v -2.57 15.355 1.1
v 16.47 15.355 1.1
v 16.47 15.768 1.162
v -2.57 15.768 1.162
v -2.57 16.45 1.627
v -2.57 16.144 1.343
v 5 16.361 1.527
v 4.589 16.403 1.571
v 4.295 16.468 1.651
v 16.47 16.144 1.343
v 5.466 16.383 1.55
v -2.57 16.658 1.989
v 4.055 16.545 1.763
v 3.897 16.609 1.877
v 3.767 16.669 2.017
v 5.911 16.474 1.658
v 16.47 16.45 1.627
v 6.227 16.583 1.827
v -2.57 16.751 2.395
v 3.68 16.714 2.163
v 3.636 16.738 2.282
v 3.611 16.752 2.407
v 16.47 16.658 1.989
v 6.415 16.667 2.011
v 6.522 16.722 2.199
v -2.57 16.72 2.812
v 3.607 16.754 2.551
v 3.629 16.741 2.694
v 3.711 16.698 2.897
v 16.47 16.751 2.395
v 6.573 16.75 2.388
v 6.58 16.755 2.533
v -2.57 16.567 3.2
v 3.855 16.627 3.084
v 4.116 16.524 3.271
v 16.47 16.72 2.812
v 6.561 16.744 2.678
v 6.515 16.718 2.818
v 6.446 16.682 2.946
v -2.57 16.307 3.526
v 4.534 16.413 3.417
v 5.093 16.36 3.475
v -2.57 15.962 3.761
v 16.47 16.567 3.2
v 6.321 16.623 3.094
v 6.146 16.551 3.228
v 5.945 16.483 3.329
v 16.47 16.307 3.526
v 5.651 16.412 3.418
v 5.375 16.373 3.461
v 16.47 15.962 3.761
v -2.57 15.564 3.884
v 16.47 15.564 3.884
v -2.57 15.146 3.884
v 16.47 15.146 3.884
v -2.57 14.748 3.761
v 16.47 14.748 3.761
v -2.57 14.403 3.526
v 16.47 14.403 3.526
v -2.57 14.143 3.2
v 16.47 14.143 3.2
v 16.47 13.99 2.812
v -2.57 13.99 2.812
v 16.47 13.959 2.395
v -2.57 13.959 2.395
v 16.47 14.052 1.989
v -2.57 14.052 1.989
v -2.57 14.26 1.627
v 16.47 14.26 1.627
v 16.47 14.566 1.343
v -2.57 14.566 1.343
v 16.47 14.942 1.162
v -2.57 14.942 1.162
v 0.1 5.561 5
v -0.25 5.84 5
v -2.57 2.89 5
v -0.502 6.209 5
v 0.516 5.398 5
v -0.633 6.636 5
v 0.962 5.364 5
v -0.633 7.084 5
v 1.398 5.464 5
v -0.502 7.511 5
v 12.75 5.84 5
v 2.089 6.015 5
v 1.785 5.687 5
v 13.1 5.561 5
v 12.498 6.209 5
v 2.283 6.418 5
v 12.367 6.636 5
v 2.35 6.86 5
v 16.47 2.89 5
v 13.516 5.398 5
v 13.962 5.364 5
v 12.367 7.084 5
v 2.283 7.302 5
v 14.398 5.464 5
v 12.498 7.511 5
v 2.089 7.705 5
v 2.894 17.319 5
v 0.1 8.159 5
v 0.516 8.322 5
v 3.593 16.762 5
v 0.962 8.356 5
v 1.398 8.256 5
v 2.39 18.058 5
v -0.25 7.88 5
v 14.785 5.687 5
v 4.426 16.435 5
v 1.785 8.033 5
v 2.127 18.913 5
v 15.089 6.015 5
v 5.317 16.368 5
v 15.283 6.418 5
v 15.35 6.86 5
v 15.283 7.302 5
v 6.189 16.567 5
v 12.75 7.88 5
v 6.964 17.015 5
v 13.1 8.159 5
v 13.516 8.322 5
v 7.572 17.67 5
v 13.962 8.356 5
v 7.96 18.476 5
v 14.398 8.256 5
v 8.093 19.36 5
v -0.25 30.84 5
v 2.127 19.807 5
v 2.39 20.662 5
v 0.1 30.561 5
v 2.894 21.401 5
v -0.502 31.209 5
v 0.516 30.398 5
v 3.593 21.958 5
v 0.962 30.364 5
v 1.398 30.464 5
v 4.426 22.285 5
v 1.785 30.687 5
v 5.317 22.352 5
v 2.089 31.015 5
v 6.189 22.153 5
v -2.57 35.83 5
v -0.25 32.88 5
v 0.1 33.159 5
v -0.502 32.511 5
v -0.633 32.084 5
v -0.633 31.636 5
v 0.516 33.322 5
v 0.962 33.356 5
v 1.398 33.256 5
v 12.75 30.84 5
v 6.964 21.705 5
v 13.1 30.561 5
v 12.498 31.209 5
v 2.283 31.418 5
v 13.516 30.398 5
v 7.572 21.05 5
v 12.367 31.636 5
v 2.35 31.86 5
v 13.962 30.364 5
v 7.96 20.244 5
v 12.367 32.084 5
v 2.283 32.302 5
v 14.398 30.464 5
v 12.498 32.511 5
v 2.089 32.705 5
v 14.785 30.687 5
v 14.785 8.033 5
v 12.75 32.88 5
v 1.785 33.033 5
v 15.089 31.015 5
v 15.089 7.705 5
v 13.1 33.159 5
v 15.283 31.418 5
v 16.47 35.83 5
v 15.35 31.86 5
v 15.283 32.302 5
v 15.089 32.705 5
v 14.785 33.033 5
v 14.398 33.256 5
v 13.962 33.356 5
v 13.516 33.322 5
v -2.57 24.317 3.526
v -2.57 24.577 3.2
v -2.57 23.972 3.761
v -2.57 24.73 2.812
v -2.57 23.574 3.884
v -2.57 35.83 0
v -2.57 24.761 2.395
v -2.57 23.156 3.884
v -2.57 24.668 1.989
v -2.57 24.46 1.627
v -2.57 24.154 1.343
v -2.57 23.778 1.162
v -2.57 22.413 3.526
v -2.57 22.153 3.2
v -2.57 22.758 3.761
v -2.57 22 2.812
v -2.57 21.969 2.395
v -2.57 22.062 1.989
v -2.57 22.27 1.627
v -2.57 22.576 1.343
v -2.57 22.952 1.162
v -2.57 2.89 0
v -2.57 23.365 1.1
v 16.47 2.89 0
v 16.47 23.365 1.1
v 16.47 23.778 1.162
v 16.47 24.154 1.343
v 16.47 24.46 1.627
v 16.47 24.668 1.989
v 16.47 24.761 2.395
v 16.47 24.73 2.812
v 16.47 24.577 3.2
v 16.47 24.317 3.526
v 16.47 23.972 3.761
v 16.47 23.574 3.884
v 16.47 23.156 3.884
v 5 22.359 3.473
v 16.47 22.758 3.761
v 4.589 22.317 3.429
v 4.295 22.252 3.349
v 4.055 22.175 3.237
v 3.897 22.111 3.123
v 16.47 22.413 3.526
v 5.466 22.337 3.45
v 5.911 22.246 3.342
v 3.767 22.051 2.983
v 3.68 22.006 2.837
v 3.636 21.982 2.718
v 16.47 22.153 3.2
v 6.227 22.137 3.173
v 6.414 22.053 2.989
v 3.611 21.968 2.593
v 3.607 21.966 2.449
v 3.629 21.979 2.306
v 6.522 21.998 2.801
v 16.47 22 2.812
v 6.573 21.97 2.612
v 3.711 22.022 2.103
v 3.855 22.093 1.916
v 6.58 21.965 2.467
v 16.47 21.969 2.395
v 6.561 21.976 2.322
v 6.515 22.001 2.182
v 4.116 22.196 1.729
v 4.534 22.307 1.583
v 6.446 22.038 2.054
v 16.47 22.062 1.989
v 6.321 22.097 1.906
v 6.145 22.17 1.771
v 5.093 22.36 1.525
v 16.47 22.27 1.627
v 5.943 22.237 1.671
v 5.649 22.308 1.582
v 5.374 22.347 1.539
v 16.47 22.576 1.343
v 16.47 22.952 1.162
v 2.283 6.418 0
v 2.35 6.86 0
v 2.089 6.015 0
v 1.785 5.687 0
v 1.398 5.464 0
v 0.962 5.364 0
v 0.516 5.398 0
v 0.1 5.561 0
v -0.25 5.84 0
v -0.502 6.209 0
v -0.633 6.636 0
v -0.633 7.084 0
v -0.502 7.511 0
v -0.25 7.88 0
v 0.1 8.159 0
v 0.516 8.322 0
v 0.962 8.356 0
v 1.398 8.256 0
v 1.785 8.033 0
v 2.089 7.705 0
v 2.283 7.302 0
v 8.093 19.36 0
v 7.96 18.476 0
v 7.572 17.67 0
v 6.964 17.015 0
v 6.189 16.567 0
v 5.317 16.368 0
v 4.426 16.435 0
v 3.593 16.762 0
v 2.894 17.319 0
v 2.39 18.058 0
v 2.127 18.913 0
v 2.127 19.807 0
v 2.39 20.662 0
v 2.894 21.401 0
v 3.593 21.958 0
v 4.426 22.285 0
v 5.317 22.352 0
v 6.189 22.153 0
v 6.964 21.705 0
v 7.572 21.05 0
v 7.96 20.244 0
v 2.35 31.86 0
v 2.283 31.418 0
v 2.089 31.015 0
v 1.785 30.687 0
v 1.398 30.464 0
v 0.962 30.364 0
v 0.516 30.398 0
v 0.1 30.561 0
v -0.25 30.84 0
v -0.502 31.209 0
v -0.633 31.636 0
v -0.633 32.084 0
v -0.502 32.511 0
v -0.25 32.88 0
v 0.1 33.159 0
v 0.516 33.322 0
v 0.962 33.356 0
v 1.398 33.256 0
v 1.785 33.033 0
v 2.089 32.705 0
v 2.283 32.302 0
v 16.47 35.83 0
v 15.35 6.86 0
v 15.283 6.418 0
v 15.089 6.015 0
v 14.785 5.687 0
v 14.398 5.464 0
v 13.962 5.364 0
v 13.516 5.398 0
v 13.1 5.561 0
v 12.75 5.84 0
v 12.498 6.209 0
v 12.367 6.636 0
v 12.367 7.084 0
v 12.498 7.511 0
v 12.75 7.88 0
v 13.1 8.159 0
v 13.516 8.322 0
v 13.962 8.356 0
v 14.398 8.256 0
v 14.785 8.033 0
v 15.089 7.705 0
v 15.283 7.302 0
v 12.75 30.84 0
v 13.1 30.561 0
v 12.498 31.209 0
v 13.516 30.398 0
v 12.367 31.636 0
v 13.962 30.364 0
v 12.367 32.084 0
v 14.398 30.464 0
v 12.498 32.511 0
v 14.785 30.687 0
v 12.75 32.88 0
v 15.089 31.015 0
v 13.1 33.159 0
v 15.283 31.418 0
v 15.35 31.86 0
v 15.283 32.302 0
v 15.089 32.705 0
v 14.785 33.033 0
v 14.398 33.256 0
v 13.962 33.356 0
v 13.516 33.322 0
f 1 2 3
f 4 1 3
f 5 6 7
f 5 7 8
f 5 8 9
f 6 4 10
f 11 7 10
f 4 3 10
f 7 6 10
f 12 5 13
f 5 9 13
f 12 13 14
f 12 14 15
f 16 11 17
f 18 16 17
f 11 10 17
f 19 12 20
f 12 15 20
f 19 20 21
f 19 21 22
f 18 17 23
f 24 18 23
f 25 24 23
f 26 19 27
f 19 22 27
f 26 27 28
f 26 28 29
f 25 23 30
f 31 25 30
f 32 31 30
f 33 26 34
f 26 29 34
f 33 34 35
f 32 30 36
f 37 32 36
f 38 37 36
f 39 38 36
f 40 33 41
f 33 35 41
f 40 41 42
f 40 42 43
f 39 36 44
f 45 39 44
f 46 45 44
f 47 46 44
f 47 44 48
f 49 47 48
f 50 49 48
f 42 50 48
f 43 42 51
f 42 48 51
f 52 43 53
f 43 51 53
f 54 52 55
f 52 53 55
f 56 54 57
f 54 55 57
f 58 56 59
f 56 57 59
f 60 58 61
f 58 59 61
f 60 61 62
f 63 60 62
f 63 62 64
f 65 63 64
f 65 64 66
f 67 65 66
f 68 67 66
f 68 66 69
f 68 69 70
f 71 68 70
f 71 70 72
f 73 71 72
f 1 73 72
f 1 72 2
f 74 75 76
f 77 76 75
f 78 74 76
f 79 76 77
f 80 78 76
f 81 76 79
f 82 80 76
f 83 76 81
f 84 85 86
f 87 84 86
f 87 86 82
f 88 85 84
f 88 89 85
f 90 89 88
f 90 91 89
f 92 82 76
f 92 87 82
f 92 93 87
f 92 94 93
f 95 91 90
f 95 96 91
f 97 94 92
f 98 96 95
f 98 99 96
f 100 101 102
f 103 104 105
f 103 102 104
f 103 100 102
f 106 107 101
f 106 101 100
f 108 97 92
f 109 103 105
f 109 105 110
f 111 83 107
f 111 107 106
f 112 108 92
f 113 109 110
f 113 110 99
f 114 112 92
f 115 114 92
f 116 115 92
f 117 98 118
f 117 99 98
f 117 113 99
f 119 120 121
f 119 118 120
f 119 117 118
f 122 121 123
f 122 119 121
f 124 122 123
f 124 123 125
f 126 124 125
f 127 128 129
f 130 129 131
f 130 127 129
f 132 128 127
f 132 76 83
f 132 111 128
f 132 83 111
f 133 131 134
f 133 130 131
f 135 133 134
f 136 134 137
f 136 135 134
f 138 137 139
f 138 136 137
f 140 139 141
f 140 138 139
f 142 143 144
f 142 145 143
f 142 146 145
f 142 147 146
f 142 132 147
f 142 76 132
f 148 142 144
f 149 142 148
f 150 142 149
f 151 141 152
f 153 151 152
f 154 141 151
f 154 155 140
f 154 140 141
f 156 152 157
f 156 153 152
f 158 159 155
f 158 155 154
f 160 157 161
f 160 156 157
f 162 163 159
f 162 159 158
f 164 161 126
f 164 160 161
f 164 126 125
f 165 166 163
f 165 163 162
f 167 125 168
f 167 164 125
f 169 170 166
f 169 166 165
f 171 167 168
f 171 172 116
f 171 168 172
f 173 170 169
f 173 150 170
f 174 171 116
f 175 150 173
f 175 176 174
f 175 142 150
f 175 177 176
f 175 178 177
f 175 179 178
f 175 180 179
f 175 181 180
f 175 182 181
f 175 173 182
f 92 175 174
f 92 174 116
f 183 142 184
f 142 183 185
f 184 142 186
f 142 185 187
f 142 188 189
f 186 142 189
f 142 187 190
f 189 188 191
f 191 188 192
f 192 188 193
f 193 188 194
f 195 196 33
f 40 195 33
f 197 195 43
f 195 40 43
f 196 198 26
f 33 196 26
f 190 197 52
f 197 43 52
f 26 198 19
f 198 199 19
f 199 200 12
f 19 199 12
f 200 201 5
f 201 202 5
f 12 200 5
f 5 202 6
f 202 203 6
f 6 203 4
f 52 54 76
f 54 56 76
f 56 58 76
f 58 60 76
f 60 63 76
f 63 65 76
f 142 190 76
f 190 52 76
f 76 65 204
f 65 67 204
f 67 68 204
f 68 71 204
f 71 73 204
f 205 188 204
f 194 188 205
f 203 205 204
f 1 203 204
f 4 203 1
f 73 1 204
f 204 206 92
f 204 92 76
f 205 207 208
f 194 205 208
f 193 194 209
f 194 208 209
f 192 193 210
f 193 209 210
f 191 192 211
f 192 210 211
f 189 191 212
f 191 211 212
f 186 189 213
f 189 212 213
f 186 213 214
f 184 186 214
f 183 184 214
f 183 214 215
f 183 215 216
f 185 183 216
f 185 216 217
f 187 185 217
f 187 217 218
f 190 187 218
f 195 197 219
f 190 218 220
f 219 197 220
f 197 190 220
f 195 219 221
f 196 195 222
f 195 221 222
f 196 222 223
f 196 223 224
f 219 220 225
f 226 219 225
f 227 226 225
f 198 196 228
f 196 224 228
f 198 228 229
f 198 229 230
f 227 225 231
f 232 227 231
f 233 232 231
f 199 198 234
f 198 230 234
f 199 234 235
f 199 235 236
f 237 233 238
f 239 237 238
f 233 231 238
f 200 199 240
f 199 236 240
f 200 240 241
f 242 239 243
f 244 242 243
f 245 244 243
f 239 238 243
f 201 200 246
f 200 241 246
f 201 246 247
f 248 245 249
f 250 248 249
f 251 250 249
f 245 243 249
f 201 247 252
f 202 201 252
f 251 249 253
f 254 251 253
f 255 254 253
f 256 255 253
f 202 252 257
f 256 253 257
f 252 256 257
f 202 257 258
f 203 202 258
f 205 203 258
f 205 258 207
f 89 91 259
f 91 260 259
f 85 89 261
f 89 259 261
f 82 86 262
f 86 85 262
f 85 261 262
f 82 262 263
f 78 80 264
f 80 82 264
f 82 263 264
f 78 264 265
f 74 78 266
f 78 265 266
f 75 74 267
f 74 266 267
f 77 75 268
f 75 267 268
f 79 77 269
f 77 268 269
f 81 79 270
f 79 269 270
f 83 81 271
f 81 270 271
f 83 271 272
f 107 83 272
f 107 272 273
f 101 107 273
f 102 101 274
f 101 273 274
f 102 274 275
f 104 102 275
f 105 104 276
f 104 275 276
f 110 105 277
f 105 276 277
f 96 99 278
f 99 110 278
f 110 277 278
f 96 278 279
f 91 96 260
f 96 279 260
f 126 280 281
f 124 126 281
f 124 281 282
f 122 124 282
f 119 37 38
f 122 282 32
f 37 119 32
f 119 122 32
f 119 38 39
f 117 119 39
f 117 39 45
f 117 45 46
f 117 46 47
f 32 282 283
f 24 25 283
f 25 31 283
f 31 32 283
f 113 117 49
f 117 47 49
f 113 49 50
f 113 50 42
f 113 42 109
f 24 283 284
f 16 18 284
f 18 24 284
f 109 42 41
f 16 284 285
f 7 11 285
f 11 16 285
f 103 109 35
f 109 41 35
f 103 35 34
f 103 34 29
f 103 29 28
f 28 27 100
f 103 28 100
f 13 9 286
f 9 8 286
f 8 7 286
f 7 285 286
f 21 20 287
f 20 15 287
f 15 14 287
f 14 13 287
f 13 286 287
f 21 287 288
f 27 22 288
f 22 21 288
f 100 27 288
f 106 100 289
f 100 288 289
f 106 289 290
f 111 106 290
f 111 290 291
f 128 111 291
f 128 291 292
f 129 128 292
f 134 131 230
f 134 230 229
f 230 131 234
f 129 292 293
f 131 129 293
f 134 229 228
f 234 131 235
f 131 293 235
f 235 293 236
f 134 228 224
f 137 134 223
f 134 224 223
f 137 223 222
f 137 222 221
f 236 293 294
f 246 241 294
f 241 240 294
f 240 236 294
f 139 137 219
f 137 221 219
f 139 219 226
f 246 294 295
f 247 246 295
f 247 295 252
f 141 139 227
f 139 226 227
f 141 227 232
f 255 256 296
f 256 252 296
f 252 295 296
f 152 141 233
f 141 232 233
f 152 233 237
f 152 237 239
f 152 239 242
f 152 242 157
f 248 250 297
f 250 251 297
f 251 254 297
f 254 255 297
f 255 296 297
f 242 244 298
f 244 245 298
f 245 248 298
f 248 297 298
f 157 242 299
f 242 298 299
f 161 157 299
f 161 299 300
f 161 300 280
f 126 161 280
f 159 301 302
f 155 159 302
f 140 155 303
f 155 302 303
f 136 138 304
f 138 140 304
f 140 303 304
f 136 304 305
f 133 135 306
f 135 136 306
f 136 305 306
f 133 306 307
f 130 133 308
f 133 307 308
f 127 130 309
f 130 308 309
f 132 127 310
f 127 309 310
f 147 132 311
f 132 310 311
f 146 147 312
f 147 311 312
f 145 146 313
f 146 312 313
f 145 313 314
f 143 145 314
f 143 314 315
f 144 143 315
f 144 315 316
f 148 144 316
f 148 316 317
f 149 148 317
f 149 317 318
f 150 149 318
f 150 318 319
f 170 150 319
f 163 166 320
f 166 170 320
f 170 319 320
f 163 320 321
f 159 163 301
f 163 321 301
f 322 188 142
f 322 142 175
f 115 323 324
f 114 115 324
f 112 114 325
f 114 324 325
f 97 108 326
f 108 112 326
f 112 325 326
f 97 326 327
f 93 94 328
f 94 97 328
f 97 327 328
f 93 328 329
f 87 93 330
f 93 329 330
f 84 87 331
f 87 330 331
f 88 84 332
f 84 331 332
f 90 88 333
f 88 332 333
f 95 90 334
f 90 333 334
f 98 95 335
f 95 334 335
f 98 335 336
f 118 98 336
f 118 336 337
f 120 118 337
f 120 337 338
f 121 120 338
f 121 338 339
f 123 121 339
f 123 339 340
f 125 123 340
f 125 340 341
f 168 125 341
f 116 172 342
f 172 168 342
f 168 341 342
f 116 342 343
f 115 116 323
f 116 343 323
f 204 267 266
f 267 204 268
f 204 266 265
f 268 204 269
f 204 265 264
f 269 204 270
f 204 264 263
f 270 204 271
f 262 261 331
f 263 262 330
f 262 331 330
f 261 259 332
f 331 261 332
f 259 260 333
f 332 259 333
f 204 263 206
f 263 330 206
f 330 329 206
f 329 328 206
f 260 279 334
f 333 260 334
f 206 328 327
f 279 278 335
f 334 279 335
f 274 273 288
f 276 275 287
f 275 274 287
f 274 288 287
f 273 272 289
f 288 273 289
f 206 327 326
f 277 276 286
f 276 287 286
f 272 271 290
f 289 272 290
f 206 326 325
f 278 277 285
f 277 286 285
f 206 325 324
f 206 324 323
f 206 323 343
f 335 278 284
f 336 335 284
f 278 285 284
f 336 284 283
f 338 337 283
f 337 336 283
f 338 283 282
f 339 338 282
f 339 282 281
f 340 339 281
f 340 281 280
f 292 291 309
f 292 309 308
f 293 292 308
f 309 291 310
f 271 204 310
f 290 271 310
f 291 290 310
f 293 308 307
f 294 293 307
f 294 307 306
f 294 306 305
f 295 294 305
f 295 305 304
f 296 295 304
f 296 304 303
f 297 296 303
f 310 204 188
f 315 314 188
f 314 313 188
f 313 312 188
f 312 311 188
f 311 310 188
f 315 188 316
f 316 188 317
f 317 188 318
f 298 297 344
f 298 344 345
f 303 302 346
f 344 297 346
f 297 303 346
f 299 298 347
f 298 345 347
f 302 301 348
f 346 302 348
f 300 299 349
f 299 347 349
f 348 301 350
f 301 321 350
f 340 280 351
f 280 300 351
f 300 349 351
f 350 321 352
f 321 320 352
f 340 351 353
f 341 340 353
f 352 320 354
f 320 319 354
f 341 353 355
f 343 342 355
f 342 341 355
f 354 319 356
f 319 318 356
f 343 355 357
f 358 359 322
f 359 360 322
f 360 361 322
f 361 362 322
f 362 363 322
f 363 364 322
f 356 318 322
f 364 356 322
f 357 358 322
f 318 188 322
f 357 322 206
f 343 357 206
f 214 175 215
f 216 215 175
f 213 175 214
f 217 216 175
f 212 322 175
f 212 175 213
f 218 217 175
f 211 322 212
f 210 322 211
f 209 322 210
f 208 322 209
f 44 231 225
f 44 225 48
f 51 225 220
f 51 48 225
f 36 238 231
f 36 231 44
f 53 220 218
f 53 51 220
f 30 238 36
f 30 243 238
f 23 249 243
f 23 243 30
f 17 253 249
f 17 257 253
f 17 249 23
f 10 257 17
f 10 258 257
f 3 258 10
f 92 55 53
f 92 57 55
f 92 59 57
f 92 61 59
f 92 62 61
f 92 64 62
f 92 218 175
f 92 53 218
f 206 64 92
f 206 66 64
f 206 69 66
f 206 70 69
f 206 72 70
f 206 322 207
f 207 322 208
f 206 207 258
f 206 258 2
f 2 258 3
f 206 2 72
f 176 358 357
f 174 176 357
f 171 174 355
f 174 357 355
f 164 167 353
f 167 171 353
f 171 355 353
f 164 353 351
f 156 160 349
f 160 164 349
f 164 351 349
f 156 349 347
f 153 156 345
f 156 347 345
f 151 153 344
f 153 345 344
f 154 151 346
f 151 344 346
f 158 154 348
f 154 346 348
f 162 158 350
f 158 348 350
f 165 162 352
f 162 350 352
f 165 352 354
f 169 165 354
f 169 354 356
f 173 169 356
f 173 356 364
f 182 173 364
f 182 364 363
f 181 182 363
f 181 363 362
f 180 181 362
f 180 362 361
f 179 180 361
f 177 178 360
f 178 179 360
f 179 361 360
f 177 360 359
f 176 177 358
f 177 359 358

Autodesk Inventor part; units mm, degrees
ref_plane "YZ Plane" through (0, 0, 0) normal (1, 0, 0) x (0, 1, 0)
ref_plane "XZ Plane" through (0, 0, 0) normal (0, 1, 0) x (-1, 0, 0)
ref_plane "XY Plane" through (0, 0, 0) normal (0, 0, 1) x (1, 0, 0)
ref_plane "Arbeitsebene1" through (-0.0002, 0, 0) normal (0, 0, 1) x (1, 0, 0)
sketch "Skizze1" plane through (-0.0002, 0, 0) normal (0, 0, 1) x (1, 0, 0)
  circle A0 centre (13.85, 6.86) radius 1.5
  circle A1 centre (0.85, 31.86) radius 1.5
  circle A2 centre (13.85, 31.86) radius 1.5
  circle A3 centre (0.85, 6.86) radius 1.5
  circle A4 centre (5.0933, 19.36) radius 5.5
  line L0 (-3.07, 5.49) -> (-3.07, 33.23)
  line L1 (-3.07, 5.49) -> (-16.87, 5.49)
  line L2 (-16.87, 13.31) -> (-16.87, 5.49)
  line L3 (-16.8476, 13.31) -> (-16.87, 13.31)
  line L4 (-16.8476, 25.41) -> (-16.8476, 13.31)
  line L5 (-16.87, 25.41) -> (-16.8476, 25.41)
  line L6 (-16.87, 33.23) -> (-16.87, 25.41)
  line L7 (-3.07, 33.23) -> (-16.87, 33.23)
  line L8 (-16.87, 40.13) -> (-16.87, 44.21)
  line L9 (-20.77, 36.23) -> (-16.87, 40.13)
  line L10 (-24.85, 36.23) -> (-20.77, 36.23)
  line L11 (-24.85, 2.49) -> (-24.85, 36.23)
  line L12 (-20.77, 2.49) -> (-24.85, 2.49)
  line L13 (-16.87, -1.41) -> (-20.77, 2.49)
  line L14 (-16.87, -1.41) -> (-16.87, -5.49)
  line L15 (-16.87, -5.49) -> (16.87, -5.49)
  line L16 (16.87, -5.49) -> (16.87, -1.41)
  line L17 (20.77, 2.49) -> (16.87, -1.41)
  line L18 (24.85, 2.49) -> (20.77, 2.49)
  line L19 (24.85, 36.23) -> (24.85, 2.49)
  line L20 (20.77, 36.23) -> (24.85, 36.23)
  line L21 (16.87, 40.13) -> (20.77, 36.23)
  line L22 (16.87, 44.21) -> (16.87, 40.13)
  line L23 (-16.87, 44.21) -> (16.87, 44.21)
  line L24 (16.97, 36.33) -> (16.97, 2.39)
  line L25 (-16.97, 36.33) -> (16.97, 36.33) construction
  line L26 (-16.97, 2.39) -> (-16.97, 36.33)
  line L27 (16.97, 2.39) -> (-16.97, 2.39) construction
  line L28 (16.97, 2.39) -> (-16.97, 2.39)
  line L29 (16.47, 35.83) -> (16.47, 2.89)
  line L30 (16.47, 2.89) -> (-16.47, 2.89)
  line L31 (-16.47, 2.89) -> (-16.47, 35.83)
  line L32 (-16.47, 35.83) -> (16.47, 35.83)
  line L33 (-2.57, 35.83) -> (-2.57, 2.89)
  circle A5 centre (5.0933, 19.36) radius 3.505
  circle A6 centre (5.0933, 19.36) radius 3
  point P0 (0.0002, 0)
  point P1 (16.47, 19.36)
extrude "Extrusion1" add sketch "Skizze1" along normal blind 5 contours A4 | L33 L32 L29 L30 | A5
sketch "Skizze5" plane through (16.4698, 2.89, 0) normal (1, 0, 0) x (0, 0, -1)
  line L0 (-23, 19.975) -> (-4.8046, 19.975)
  line L1 (-23, 12.965) -> (-4.8046, 12.965)
  circle A0 centre (-2.5, 20.475) radius 1.4
  circle A1 centre (-2.5, 12.465) radius 1.4
  line L2 (-2.5, 20.475) -> (-2.5, 12.465) construction
  line L3 (0, 32.94) -> (-5, 32.94) projected
  line L4 (-5, 0) -> (-5, 32.94) projected
  line L5 (-5, 16.47) -> (0, 16.47) construction
  line L6 (0, 0) -> (0, 32.94) projected
  point P0 (0, -2.89)
  point P1 (-2.5, 32.94)
  point P2 (-2.5, 16.47)
  dimension "d19" = 2.8
  dimension "d20" = 2.8
  dimension "d21" = 0.5
  dimension "d22" = 0.5
extrude "Extrusion4" cut sketch "Skizze5" against normal through all
equation "\"d22\" = d21"
properties part number "30_Cube_Z_Focus_NEMA8_captive_micrometerscrewbase_v0"
